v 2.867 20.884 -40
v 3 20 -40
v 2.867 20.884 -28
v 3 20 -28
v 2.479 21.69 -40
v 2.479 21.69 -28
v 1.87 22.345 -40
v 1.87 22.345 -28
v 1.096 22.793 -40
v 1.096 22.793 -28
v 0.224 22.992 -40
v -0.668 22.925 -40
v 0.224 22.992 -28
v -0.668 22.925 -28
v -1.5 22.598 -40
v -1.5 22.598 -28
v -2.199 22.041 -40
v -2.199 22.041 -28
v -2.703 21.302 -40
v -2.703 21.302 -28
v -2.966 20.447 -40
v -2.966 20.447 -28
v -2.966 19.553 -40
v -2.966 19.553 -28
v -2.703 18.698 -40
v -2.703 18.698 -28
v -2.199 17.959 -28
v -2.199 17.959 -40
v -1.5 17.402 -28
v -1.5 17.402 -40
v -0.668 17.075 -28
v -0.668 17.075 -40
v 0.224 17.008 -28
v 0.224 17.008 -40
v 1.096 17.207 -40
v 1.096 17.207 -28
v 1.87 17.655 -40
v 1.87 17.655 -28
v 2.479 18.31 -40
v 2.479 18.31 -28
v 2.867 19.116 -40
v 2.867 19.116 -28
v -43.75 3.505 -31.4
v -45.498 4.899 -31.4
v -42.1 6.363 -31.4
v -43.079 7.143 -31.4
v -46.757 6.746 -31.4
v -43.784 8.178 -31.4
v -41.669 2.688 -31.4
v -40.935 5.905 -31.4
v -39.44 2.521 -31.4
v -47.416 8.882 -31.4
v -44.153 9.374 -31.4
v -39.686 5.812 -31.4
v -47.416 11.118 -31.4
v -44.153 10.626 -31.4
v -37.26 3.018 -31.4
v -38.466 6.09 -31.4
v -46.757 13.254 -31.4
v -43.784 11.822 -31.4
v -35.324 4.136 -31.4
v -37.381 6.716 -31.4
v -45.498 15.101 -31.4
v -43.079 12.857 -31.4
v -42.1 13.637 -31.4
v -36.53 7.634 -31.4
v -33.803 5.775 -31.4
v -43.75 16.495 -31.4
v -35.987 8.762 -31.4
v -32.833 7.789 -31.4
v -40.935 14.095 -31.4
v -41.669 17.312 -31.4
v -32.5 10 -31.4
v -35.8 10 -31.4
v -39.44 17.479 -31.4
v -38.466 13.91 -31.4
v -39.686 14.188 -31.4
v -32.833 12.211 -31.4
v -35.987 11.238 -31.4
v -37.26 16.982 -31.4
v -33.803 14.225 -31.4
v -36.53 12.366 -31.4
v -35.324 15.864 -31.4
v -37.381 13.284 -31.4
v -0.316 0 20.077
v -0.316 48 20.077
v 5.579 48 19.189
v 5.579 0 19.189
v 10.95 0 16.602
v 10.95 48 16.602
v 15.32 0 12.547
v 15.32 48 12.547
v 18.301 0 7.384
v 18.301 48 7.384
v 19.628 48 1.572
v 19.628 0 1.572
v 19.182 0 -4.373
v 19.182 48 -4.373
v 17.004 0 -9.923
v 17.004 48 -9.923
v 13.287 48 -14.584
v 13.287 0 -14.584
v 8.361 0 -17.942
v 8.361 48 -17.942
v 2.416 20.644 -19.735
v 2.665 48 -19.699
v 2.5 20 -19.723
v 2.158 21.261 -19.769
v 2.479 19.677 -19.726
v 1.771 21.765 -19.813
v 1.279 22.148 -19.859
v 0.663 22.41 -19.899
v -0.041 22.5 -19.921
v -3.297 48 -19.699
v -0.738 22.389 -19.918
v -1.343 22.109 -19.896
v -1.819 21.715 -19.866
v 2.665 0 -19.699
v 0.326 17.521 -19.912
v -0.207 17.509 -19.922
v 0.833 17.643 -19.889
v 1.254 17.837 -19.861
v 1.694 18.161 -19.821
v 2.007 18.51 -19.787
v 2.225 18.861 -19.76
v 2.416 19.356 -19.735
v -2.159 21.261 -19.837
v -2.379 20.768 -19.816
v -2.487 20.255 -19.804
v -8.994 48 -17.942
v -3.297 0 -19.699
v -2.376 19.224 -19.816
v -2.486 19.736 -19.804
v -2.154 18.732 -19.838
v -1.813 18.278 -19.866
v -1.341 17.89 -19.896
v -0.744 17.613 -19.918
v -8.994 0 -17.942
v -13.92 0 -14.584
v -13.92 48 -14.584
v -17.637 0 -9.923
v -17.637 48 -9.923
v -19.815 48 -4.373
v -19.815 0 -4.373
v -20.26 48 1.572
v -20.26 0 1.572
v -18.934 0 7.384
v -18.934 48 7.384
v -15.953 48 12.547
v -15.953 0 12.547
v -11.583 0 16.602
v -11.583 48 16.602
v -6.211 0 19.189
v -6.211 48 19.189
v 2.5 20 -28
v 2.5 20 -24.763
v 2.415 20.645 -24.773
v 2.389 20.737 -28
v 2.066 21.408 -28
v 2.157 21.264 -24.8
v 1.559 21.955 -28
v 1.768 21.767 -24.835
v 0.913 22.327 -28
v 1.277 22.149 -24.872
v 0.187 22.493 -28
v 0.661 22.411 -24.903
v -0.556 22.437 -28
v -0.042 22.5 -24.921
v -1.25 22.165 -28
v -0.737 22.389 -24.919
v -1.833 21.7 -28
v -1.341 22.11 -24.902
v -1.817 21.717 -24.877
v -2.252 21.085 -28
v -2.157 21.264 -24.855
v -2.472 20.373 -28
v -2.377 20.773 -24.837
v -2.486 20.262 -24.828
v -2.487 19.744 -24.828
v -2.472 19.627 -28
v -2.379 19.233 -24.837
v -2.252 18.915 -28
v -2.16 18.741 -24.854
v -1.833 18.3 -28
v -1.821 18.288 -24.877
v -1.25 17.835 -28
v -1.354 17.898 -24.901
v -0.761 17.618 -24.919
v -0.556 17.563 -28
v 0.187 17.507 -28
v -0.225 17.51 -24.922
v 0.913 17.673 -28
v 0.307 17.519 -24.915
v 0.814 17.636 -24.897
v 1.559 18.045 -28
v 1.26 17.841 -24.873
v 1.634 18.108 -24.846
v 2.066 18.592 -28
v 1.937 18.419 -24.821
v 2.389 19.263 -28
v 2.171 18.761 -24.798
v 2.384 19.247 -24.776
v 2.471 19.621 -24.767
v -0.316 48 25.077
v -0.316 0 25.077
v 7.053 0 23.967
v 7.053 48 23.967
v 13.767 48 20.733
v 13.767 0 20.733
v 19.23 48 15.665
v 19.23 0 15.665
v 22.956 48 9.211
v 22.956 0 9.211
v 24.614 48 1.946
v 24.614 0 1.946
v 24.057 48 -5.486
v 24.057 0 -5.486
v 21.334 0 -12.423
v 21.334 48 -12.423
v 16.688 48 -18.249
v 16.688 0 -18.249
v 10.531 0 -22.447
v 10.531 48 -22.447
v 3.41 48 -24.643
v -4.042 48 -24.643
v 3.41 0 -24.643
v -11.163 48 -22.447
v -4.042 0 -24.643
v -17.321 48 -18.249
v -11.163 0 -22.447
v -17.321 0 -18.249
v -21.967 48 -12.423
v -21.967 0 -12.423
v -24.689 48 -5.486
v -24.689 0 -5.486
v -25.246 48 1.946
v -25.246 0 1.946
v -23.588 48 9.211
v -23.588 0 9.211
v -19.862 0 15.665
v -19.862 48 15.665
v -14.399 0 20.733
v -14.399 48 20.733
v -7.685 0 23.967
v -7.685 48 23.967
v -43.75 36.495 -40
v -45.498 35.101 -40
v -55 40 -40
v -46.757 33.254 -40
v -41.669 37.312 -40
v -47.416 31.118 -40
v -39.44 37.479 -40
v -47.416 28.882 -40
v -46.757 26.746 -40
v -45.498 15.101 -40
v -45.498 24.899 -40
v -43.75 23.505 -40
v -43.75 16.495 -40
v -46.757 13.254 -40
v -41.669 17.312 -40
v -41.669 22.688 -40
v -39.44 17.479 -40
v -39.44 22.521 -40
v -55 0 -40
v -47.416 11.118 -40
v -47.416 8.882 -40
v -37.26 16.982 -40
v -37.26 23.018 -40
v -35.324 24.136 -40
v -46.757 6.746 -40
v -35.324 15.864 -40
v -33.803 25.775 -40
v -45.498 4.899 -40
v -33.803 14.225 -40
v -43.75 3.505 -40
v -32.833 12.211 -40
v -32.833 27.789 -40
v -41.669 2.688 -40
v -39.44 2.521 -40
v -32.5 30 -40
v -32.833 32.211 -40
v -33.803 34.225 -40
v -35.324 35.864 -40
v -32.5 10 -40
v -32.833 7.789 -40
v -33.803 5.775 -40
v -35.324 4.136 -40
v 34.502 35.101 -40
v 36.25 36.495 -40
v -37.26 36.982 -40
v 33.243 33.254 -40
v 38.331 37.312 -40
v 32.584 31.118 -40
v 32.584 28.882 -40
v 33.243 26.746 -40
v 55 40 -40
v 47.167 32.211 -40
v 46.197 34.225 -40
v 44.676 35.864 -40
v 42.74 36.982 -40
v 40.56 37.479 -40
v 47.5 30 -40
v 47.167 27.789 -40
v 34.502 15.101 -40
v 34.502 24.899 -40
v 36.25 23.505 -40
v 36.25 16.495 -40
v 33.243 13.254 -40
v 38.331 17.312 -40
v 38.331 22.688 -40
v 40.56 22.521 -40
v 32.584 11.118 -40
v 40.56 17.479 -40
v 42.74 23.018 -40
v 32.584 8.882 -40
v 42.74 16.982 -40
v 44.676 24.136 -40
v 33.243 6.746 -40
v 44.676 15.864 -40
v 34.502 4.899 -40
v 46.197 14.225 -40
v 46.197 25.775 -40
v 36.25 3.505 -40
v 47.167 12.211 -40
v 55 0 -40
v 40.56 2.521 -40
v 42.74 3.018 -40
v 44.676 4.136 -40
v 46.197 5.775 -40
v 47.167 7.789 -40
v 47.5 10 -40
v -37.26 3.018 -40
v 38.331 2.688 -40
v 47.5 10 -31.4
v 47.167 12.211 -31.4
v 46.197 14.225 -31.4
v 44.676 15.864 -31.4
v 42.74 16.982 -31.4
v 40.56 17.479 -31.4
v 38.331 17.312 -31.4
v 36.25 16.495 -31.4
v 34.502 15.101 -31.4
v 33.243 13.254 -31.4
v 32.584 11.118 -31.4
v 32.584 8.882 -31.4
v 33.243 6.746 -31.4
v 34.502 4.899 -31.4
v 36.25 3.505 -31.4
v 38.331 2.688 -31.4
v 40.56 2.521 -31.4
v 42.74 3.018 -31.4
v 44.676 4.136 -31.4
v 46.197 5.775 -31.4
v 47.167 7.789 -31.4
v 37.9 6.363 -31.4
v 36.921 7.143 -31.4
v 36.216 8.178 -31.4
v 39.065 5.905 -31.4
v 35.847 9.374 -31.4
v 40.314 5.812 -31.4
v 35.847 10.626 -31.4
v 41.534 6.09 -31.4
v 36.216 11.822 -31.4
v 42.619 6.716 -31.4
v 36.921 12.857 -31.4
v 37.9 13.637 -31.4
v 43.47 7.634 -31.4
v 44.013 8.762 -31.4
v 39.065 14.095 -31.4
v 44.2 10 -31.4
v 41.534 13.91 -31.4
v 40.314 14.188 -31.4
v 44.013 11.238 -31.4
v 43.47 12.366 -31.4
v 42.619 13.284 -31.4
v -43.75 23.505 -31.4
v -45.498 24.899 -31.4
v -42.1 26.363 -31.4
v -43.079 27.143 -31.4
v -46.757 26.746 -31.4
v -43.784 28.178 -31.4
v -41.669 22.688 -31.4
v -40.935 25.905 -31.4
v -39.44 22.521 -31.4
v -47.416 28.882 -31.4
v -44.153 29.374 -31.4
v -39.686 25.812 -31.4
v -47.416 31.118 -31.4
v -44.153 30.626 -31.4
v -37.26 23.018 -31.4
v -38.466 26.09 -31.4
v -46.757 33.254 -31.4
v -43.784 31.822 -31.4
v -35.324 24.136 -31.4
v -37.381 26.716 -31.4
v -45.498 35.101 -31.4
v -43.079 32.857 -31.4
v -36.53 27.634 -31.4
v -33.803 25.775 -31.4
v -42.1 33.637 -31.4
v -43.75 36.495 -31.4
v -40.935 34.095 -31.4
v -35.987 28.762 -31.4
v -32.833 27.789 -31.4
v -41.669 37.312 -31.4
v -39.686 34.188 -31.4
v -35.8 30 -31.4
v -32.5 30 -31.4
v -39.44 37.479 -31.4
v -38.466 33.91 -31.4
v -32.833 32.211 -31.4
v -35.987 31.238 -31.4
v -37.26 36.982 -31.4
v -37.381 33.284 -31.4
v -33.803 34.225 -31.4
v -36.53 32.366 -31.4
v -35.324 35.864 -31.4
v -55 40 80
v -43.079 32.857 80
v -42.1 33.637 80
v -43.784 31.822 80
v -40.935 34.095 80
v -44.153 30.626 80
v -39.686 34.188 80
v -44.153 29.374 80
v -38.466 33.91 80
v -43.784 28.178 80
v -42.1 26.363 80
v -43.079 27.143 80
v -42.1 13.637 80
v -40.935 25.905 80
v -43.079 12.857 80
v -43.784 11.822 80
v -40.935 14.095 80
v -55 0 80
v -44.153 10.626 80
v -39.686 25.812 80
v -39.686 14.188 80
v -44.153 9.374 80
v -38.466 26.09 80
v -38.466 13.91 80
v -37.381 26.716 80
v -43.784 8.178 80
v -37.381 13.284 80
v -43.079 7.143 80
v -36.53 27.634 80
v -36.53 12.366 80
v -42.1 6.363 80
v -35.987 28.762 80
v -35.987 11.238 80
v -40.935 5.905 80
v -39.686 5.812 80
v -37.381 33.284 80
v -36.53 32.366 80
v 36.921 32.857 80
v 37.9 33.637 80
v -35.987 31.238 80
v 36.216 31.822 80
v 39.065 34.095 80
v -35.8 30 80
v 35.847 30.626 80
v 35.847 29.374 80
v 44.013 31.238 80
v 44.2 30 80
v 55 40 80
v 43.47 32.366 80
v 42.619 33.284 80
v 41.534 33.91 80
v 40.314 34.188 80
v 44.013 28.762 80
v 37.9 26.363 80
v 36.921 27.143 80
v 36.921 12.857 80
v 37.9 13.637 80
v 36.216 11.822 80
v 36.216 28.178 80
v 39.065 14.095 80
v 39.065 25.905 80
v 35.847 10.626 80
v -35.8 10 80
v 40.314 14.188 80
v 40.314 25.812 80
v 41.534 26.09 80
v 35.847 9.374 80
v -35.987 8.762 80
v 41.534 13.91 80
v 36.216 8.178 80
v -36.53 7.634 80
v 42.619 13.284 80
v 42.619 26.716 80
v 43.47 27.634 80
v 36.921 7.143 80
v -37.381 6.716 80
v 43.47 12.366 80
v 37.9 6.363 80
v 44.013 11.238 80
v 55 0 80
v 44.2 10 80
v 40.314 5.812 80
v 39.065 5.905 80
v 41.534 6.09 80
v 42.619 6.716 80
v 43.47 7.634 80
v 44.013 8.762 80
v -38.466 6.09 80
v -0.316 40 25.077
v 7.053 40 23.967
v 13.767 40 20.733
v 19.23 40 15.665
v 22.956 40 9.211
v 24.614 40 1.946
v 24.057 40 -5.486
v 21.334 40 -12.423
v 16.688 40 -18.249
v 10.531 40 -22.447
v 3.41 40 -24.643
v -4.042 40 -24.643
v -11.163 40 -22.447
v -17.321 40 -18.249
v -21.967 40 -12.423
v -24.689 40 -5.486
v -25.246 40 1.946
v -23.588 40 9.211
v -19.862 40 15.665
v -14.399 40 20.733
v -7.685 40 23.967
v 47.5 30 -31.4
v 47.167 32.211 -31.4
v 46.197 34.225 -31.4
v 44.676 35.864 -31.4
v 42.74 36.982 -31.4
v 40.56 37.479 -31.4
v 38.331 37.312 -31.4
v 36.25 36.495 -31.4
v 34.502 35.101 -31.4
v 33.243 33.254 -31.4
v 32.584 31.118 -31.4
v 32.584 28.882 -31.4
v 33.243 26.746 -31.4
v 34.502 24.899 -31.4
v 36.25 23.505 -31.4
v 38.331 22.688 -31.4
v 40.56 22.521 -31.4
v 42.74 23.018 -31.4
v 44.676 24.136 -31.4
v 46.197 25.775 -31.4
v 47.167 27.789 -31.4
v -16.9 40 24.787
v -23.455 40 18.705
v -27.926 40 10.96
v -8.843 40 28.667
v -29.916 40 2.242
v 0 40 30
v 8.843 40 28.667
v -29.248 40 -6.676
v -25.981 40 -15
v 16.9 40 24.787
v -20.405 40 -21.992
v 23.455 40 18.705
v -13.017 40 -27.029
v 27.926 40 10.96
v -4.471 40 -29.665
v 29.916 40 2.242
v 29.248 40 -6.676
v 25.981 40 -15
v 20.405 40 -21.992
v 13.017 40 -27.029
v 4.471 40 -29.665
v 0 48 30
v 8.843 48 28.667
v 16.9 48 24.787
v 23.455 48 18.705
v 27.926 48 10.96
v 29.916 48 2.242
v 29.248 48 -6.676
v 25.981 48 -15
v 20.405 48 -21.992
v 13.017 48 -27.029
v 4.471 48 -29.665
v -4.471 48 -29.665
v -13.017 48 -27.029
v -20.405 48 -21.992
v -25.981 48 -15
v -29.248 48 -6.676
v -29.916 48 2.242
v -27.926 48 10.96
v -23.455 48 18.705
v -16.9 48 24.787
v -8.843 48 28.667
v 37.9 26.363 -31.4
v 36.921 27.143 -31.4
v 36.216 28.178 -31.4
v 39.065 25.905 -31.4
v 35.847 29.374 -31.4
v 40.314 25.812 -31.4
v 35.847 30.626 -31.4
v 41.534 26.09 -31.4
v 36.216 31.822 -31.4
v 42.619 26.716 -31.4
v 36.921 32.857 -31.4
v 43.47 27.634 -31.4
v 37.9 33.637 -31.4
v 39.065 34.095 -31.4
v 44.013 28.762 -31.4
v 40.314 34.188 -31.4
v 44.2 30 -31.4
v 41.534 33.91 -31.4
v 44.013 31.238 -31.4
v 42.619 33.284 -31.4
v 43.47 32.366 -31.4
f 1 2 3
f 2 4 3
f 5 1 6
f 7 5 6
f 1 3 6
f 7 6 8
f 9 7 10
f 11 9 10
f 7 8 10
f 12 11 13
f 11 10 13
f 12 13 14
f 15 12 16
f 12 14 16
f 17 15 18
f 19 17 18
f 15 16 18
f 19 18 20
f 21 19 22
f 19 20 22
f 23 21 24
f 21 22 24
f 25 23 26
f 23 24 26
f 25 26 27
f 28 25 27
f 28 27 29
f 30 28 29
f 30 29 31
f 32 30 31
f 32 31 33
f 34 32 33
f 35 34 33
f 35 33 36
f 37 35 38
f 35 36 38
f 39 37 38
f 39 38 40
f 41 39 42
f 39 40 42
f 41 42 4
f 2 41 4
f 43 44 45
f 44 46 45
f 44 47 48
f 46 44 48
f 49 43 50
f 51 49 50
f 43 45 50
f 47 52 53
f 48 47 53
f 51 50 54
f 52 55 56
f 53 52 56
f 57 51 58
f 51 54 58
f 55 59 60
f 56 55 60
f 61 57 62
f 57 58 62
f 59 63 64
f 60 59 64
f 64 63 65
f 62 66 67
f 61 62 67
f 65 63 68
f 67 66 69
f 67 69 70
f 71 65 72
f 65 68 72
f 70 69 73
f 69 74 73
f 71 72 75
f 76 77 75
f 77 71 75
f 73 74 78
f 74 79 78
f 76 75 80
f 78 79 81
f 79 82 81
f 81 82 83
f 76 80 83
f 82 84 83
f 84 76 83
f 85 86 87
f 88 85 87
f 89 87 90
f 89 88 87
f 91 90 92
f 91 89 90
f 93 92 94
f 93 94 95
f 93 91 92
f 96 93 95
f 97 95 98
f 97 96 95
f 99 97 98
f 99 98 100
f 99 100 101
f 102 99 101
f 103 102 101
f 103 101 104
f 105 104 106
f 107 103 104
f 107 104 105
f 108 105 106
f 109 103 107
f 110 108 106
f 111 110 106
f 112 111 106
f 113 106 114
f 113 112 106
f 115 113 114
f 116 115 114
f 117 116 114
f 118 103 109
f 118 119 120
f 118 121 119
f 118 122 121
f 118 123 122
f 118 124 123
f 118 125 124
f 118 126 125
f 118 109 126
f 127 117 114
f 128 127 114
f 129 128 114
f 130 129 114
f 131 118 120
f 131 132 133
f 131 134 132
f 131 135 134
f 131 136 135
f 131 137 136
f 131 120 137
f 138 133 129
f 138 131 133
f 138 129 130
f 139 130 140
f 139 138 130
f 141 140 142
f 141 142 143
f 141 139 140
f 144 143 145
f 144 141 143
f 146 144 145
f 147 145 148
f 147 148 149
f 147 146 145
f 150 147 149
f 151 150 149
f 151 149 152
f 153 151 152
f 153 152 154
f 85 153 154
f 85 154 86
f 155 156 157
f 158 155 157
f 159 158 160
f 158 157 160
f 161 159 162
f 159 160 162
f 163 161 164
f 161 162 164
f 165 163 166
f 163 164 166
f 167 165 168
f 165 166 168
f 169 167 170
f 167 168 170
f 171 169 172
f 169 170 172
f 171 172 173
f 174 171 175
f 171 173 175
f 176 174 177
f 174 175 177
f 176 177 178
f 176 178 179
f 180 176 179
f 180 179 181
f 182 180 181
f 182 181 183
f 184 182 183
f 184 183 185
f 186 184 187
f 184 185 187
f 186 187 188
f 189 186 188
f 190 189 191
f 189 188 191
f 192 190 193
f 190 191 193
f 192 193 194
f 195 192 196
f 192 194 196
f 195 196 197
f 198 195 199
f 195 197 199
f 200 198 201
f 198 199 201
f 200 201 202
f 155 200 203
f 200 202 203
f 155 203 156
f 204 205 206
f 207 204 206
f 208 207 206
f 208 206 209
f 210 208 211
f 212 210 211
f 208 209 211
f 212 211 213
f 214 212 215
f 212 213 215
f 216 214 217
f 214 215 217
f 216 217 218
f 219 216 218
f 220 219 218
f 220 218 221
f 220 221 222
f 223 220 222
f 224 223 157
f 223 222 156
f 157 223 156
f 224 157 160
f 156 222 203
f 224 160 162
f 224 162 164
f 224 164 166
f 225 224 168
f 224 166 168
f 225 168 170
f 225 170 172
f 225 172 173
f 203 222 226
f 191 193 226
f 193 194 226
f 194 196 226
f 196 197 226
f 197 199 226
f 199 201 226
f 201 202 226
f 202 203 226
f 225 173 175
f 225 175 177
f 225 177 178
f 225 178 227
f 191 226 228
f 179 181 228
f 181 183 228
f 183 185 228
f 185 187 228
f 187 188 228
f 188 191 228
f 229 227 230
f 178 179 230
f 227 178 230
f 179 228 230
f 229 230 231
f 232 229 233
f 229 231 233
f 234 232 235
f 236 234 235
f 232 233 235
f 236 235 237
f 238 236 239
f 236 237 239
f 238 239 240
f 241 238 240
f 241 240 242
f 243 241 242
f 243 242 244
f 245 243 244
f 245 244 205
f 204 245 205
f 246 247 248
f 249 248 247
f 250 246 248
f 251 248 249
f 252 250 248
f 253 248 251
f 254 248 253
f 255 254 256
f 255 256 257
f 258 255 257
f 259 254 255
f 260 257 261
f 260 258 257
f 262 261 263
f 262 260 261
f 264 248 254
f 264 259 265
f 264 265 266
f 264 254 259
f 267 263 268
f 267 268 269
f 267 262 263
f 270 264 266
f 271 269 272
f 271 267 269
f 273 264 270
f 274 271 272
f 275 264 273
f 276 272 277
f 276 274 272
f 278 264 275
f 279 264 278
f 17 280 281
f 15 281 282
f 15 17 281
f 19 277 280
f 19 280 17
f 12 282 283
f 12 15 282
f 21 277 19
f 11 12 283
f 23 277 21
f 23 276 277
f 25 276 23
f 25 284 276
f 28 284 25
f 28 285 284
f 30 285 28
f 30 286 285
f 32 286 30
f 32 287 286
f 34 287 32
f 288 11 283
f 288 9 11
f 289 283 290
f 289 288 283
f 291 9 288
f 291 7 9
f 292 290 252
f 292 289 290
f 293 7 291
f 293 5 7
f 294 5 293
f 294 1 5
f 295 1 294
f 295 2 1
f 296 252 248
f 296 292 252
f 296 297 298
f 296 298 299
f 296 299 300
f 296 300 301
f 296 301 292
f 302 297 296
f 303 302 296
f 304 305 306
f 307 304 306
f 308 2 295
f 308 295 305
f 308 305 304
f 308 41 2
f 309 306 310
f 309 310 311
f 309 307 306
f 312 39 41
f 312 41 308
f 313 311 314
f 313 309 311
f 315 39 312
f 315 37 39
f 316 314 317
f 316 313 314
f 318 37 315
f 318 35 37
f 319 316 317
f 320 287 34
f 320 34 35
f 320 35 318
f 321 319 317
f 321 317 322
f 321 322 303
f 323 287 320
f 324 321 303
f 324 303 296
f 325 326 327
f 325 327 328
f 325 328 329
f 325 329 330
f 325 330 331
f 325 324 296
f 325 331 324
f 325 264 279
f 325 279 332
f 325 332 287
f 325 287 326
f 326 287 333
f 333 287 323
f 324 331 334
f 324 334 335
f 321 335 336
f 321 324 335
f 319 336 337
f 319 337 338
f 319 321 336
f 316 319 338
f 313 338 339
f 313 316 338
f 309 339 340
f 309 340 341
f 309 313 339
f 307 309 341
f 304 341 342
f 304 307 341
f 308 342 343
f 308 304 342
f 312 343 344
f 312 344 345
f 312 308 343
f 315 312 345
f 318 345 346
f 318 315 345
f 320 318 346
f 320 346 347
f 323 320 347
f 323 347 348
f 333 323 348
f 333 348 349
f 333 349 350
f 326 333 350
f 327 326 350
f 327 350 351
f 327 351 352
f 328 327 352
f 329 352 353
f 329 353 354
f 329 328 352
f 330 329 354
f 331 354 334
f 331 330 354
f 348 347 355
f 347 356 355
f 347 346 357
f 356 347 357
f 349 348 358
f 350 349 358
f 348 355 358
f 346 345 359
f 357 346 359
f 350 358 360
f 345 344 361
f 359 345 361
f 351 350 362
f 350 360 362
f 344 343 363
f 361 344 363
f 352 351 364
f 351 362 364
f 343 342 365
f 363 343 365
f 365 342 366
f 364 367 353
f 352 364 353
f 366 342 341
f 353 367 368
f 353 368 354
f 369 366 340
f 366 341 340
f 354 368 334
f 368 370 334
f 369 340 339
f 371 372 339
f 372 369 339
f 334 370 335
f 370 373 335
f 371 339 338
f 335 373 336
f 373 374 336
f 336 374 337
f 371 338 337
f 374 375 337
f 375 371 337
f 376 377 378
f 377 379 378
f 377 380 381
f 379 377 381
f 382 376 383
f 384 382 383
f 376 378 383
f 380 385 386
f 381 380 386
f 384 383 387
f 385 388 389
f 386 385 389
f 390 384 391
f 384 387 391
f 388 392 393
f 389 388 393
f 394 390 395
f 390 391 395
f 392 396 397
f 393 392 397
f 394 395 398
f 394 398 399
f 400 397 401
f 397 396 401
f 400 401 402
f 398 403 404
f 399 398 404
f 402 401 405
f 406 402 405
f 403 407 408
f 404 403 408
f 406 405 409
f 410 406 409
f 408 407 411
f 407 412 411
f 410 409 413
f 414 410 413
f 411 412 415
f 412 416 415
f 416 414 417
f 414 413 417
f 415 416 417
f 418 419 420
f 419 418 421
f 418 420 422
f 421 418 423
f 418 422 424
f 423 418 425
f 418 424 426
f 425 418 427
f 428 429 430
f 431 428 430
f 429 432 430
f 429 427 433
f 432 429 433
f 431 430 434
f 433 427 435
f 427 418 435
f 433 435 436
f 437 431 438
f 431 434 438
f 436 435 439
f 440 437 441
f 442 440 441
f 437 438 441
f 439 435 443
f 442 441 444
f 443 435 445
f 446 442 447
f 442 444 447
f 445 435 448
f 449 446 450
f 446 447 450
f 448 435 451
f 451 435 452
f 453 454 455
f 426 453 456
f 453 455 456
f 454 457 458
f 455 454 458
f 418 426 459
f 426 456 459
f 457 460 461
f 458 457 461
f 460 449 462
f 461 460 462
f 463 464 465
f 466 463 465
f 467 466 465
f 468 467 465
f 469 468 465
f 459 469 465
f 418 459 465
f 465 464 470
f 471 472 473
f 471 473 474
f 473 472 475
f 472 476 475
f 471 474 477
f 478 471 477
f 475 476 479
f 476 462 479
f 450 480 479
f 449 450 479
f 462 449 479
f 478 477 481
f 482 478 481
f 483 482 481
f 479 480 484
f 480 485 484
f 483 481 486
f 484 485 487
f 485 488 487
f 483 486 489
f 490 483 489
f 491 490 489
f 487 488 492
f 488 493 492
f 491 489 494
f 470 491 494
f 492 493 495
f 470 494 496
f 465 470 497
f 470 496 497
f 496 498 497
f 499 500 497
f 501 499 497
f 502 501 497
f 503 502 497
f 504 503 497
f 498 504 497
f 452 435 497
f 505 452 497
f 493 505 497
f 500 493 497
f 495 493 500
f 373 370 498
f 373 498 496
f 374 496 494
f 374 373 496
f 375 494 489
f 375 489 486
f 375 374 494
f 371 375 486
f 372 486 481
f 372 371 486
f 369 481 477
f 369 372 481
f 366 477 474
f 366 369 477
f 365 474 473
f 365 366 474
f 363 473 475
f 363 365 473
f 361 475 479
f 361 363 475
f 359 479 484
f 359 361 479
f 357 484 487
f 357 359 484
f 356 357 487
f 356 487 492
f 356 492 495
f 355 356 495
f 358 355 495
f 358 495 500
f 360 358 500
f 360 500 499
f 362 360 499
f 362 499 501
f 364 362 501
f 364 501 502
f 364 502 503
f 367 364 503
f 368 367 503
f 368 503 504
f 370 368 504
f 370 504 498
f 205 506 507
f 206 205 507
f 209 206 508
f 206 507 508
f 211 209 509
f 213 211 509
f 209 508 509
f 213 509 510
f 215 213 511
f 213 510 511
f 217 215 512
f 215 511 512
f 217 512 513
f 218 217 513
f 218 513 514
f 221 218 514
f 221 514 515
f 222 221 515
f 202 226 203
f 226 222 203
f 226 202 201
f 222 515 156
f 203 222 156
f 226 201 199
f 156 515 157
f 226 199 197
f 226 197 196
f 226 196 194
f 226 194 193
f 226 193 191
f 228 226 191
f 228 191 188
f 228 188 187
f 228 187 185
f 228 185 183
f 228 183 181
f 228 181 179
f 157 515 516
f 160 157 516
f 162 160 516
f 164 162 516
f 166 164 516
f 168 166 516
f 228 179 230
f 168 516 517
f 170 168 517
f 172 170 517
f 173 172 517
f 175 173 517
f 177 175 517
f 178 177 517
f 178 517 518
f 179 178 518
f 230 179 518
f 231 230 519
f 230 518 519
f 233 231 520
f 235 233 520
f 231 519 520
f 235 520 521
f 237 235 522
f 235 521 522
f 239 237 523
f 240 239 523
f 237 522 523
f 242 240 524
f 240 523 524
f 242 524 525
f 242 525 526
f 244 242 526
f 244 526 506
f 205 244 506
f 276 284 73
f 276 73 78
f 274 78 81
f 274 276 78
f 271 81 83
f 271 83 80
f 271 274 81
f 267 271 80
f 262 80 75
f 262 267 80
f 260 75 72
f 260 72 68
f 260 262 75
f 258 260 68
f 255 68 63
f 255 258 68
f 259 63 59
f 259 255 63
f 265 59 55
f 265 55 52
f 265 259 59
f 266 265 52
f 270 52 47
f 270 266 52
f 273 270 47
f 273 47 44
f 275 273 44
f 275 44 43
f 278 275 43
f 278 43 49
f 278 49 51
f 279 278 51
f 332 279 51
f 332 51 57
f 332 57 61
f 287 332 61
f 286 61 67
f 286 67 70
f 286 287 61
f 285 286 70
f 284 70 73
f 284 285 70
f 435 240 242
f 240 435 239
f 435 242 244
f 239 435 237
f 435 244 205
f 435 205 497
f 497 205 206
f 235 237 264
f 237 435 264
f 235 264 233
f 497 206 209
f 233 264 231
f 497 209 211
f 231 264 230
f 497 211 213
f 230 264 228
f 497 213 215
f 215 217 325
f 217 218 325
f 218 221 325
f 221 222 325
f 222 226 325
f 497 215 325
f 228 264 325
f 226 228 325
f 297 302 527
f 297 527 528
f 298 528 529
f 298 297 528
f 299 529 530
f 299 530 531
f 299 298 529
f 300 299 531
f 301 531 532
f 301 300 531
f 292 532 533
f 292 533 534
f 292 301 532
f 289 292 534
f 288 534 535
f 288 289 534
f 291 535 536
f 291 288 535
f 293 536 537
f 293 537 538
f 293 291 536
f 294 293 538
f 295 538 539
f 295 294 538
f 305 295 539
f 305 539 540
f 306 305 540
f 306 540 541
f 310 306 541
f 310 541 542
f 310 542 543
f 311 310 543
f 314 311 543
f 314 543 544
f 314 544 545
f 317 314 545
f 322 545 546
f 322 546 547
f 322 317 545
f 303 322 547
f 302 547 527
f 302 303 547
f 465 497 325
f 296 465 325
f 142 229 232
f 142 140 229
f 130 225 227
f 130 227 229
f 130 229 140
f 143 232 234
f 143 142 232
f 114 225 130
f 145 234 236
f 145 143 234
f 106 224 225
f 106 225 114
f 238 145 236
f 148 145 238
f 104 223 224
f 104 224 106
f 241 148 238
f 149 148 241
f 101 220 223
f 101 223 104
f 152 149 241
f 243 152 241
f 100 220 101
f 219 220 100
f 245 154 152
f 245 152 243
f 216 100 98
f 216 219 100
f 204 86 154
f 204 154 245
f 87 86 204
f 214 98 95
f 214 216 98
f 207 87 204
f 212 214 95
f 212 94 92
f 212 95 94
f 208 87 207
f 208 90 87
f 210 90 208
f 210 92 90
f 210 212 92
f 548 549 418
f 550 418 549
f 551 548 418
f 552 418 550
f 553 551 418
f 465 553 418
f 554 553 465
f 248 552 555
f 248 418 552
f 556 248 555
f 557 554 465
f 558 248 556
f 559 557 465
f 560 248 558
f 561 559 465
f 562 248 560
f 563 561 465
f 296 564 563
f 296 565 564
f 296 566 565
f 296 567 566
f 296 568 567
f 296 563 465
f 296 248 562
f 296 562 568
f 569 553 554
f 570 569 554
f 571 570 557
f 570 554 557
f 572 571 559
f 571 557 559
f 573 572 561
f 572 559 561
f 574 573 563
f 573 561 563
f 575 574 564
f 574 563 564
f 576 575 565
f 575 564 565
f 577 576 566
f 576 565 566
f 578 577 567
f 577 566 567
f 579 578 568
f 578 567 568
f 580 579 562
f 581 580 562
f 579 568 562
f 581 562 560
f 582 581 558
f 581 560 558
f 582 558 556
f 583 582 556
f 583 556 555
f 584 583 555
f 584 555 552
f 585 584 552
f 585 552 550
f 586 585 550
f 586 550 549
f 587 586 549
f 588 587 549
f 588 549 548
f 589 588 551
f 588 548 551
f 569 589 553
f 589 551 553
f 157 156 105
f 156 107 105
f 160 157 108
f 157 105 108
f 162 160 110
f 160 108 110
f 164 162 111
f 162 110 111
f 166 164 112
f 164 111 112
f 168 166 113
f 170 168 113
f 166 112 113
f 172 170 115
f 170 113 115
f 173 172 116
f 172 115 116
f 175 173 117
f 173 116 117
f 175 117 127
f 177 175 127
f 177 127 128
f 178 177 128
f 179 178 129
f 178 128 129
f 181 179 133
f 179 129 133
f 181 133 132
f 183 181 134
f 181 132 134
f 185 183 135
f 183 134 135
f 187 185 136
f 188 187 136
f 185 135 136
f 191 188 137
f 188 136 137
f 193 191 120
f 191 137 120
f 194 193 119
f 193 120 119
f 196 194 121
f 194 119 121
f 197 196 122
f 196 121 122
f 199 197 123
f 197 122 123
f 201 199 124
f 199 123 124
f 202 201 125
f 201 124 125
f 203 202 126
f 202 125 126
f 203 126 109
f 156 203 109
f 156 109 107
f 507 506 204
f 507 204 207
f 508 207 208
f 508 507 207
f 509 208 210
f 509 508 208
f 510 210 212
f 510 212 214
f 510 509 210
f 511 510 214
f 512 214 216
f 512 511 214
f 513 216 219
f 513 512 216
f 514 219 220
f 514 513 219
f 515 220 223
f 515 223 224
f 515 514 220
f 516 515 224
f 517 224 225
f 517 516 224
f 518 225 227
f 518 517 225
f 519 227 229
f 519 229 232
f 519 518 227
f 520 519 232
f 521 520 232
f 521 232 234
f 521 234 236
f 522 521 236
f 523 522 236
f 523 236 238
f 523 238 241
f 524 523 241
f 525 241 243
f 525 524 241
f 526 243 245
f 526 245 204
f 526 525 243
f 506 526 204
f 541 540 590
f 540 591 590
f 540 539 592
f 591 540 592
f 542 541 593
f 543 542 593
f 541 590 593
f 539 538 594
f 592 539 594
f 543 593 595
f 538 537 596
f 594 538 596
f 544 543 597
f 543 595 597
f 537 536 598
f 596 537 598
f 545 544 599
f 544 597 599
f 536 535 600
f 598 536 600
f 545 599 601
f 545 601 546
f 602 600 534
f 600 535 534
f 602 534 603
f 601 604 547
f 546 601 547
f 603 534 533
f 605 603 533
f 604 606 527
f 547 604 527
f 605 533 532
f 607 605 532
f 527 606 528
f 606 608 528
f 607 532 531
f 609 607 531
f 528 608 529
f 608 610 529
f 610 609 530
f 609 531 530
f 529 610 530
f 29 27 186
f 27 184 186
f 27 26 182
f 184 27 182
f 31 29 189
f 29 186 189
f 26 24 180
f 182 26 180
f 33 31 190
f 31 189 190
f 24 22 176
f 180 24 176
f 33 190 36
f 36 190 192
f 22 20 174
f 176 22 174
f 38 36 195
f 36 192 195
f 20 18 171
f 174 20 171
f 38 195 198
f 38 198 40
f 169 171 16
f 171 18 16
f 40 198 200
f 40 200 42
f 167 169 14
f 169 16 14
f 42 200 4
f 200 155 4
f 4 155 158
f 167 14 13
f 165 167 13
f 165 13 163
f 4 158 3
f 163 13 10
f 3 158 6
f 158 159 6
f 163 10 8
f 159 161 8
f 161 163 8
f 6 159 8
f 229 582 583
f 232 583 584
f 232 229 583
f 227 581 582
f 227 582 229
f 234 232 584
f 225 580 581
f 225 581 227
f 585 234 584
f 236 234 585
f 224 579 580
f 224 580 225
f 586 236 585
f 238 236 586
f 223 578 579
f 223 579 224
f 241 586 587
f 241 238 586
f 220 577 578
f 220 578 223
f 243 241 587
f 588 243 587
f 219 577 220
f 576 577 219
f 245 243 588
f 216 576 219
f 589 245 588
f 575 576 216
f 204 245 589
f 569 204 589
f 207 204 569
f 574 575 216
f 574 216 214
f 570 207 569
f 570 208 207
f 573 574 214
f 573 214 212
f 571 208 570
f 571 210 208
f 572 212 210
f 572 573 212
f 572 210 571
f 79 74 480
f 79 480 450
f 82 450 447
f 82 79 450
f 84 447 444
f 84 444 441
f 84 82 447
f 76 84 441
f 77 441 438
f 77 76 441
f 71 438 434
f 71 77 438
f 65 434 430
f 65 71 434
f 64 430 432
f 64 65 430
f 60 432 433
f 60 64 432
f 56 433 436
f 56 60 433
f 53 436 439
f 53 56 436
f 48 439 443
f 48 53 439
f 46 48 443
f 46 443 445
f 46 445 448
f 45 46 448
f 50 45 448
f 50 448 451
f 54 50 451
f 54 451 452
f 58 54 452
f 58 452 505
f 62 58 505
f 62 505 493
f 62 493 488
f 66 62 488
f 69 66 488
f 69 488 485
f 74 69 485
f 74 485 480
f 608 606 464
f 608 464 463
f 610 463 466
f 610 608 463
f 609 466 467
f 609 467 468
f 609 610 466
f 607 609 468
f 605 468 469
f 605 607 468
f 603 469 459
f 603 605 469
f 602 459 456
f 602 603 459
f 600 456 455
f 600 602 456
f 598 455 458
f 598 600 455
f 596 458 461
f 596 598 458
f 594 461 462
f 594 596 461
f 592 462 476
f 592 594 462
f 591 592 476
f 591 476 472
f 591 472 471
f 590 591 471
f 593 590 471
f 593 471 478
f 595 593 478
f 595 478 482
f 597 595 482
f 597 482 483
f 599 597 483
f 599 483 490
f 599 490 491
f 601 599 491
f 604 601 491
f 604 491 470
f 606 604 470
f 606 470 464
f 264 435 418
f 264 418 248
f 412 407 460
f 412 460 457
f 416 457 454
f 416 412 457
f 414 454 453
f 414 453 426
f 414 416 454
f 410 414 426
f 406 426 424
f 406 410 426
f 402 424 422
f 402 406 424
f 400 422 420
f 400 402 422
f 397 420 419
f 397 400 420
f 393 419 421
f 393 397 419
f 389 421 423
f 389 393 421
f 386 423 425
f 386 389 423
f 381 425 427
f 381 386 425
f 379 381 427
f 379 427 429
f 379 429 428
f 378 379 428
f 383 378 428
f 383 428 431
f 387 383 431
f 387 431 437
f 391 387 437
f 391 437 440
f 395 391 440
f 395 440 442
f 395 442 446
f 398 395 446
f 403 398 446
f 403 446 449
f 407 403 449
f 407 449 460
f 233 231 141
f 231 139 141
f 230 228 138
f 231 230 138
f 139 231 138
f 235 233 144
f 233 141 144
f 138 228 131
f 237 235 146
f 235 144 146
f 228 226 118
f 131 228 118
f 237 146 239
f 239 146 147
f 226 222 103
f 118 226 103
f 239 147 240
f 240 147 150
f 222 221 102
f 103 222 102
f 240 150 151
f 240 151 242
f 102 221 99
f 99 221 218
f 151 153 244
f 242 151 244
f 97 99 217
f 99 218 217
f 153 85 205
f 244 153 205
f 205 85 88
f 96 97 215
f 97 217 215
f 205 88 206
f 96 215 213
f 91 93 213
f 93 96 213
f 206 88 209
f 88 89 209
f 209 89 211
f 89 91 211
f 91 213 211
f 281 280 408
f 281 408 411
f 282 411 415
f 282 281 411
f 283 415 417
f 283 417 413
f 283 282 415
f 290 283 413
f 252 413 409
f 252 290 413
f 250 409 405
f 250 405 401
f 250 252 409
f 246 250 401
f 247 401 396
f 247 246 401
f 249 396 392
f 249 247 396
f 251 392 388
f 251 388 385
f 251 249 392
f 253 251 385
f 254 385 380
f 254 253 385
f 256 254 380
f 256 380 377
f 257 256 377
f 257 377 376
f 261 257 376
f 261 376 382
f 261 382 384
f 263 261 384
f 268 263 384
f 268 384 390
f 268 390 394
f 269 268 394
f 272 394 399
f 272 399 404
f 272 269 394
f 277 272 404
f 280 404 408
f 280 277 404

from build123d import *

# Parameters (mm, degrees)
SKETCH1_W                                     = 110
SKETCH1_H                                     = 120
GUIDE_BLOCK_DEPTH                             = 40
SKETCH2_R                                     = 30
SKETCH2_R_2                                   = 25
BUSH_BOSS_DEPTH                               = 8
SKETCH3_R                                     = 25
CUT_EXTRUDE1_DEPTH                            = 106
SKETCH8_R                                     = 25
SKETCH8_R_2                                   = 20
BOSS_EXTRUDE3_DEPTH                           = 48
CBORE_START                                   = -40
CBORE_FOR_M8_HEX_SOCKET_HEAD_CAP_SCR_2_R      = 4.2
CBORE_FOR_M8_HEX_SOCKET_HEAD_CAP_SCREW1_DEPTH = 120
CBORE_FOR_M8_HEX_SOCKET_HEAD_CAP_SCR_3_O_R    = 7.5
CBORE_FOR_M8_HEX_SOCKET_HEAD_CAP_SCR_3_O_R_2  = 4.2
CBORE_FOR_M8_HEX_SOCKET_HEAD_CAP_SCR_3_DEPTH  = 8.6


# Read off the part's stored shape, not the designer's step: M6 Tapped Hole1, CBORE for M8 Hex Socket Head Cap Screw1
with BuildPart() as part:
    # Sketch1 → GUIDE_BLOCK (new body)
    with BuildSketch(Plane(origin=(0, 0, 0), x_dir=(1, 0, 0), z_dir=(0, 1, 0))):
        with Locations((0, -20)):
            Rectangle(SKETCH1_W, SKETCH1_H)
    extrude(amount=GUIDE_BLOCK_DEPTH)

    # Sketch2 → BUSH_BOSS (add)
    with BuildSketch(Plane(origin=(0, 40, 0), x_dir=(1, 0, 0), z_dir=(0, 1, 0))):
        with Locations(Location((0, 0, 0), (0, 0, 270))):
            Circle(SKETCH2_R)
        with Locations(Location((-0.316230532, -0.07747648, 0), (0, 0, 270))):
            Circle(SKETCH2_R_2, mode=Mode.SUBTRACT)
    extrude(amount=BUSH_BOSS_DEPTH)

    # Sketch3 → Cut-Extrude1 (cut, through all)
    with BuildSketch(Plane(origin=(0, 40, 0), x_dir=(1, 0, 0), z_dir=(0, 1, 0))):
        with Locations(Location((-0.316230532, -0.07747648, 0), (0, 0, 270))):
            Circle(SKETCH3_R)
    extrude(amount=-CUT_EXTRUDE1_DEPTH, mode=Mode.SUBTRACT)


with BuildPart() as body_2:
    # Sketch8 → Boss-Extrude3 (new body)
    with BuildSketch(Plane(origin=(0, 0, 0), x_dir=(1, 0, 0), z_dir=(0, 1, 0))):
        with Locations(Location((-0.316230532, -0.07747648, 0), (0, 0, 270))):
            Circle(SKETCH8_R)
        with Locations(Location((-0.316230532, -0.07747648, 0), (0, 0, 270))):
            Circle(SKETCH8_R_2, mode=Mode.SUBTRACT)
    extrude(amount=BOSS_EXTRUDE3_DEPTH)


with BuildPart() as m6_tapped_hole1_tool:
    # M6 Tapped Hole1 outline → M6 Tapped Hole1 (revolve)
    with BuildSketch(Plane.XZ.offset(-20)):
        Polygon((2.5, -19.723195432), (0, -19.723195432), (0, -40), (3, -40), (3, -28), (2.5, -28), align=None)
    revolve(axis=Axis((0, 20, 0), (0, 0, 1)))


with BuildPart() as part_1:
    add(part.part)

    # M6 Tapped Hole1: cut by m6_tapped_hole1_tool
    add(m6_tapped_hole1_tool.part, mode=Mode.SUBTRACT)

    # CBORE for M8 Hex Socket Head Cap Scr 2 → CBORE for M8 Hex Socket Head Cap Screw1 (cut)
    with BuildSketch(Plane.XY.offset(CBORE_START)):
        with Locations((-40, 10)):
            Circle(CBORE_FOR_M8_HEX_SOCKET_HEAD_CAP_SCR_2_R)
        with Locations((40, 30)):
            Circle(CBORE_FOR_M8_HEX_SOCKET_HEAD_CAP_SCR_2_R)
        with Locations((-40, 30)):
            Circle(CBORE_FOR_M8_HEX_SOCKET_HEAD_CAP_SCR_2_R)
        with Locations((40, 10)):
            Circle(CBORE_FOR_M8_HEX_SOCKET_HEAD_CAP_SCR_2_R)
    extrude(amount=CBORE_FOR_M8_HEX_SOCKET_HEAD_CAP_SCREW1_DEPTH, mode=Mode.SUBTRACT)

    # CBORE for M8 Hex Socket Head Cap Scr 3 o → CBORE for M8 Hex Socket Head Cap Scr 3 (cut)
    # profile 1 of 4: a face of its own
    with BuildSketch(Plane.XY.offset(CBORE_START)):
        with Locations((-40, 10)):
            Circle(CBORE_FOR_M8_HEX_SOCKET_HEAD_CAP_SCR_3_O_R)
        with Locations((-40, 10)):
            Circle(CBORE_FOR_M8_HEX_SOCKET_HEAD_CAP_SCR_3_O_R_2, mode=Mode.SUBTRACT)
    # profile 2 of 4: a face of its own
    with BuildSketch(Plane.XY.offset(CBORE_START)):
        with Locations((40, 30)):
            Circle(CBORE_FOR_M8_HEX_SOCKET_HEAD_CAP_SCR_3_O_R)
        with Locations((40, 30)):
            Circle(CBORE_FOR_M8_HEX_SOCKET_HEAD_CAP_SCR_3_O_R_2, mode=Mode.SUBTRACT)
    # profile 3 of 4: a face of its own
    with BuildSketch(Plane.XY.offset(CBORE_START)):
        with Locations((-40, 30)):
            Circle(CBORE_FOR_M8_HEX_SOCKET_HEAD_CAP_SCR_3_O_R)
        with Locations((-40, 30)):
            Circle(CBORE_FOR_M8_HEX_SOCKET_HEAD_CAP_SCR_3_O_R_2, mode=Mode.SUBTRACT)
    # profile 4 of 4: a face of its own
    with BuildSketch(Plane.XY.offset(CBORE_START)):
        with Locations((40, 10)):
            Circle(CBORE_FOR_M8_HEX_SOCKET_HEAD_CAP_SCR_3_O_R)
        with Locations((40, 10)):
            Circle(CBORE_FOR_M8_HEX_SOCKET_HEAD_CAP_SCR_3_O_R_2, mode=Mode.SUBTRACT)
    extrude(amount=CBORE_FOR_M8_HEX_SOCKET_HEAD_CAP_SCR_3_DEPTH, mode=Mode.SUBTRACT)


with BuildPart() as body_2_1:
    add(body_2.part)

    # M6 Tapped Hole1: cut by m6_tapped_hole1_tool
    add(m6_tapped_hole1_tool.part, mode=Mode.SUBTRACT)


solid = Compound([part_1.part, body_2_1.part])
